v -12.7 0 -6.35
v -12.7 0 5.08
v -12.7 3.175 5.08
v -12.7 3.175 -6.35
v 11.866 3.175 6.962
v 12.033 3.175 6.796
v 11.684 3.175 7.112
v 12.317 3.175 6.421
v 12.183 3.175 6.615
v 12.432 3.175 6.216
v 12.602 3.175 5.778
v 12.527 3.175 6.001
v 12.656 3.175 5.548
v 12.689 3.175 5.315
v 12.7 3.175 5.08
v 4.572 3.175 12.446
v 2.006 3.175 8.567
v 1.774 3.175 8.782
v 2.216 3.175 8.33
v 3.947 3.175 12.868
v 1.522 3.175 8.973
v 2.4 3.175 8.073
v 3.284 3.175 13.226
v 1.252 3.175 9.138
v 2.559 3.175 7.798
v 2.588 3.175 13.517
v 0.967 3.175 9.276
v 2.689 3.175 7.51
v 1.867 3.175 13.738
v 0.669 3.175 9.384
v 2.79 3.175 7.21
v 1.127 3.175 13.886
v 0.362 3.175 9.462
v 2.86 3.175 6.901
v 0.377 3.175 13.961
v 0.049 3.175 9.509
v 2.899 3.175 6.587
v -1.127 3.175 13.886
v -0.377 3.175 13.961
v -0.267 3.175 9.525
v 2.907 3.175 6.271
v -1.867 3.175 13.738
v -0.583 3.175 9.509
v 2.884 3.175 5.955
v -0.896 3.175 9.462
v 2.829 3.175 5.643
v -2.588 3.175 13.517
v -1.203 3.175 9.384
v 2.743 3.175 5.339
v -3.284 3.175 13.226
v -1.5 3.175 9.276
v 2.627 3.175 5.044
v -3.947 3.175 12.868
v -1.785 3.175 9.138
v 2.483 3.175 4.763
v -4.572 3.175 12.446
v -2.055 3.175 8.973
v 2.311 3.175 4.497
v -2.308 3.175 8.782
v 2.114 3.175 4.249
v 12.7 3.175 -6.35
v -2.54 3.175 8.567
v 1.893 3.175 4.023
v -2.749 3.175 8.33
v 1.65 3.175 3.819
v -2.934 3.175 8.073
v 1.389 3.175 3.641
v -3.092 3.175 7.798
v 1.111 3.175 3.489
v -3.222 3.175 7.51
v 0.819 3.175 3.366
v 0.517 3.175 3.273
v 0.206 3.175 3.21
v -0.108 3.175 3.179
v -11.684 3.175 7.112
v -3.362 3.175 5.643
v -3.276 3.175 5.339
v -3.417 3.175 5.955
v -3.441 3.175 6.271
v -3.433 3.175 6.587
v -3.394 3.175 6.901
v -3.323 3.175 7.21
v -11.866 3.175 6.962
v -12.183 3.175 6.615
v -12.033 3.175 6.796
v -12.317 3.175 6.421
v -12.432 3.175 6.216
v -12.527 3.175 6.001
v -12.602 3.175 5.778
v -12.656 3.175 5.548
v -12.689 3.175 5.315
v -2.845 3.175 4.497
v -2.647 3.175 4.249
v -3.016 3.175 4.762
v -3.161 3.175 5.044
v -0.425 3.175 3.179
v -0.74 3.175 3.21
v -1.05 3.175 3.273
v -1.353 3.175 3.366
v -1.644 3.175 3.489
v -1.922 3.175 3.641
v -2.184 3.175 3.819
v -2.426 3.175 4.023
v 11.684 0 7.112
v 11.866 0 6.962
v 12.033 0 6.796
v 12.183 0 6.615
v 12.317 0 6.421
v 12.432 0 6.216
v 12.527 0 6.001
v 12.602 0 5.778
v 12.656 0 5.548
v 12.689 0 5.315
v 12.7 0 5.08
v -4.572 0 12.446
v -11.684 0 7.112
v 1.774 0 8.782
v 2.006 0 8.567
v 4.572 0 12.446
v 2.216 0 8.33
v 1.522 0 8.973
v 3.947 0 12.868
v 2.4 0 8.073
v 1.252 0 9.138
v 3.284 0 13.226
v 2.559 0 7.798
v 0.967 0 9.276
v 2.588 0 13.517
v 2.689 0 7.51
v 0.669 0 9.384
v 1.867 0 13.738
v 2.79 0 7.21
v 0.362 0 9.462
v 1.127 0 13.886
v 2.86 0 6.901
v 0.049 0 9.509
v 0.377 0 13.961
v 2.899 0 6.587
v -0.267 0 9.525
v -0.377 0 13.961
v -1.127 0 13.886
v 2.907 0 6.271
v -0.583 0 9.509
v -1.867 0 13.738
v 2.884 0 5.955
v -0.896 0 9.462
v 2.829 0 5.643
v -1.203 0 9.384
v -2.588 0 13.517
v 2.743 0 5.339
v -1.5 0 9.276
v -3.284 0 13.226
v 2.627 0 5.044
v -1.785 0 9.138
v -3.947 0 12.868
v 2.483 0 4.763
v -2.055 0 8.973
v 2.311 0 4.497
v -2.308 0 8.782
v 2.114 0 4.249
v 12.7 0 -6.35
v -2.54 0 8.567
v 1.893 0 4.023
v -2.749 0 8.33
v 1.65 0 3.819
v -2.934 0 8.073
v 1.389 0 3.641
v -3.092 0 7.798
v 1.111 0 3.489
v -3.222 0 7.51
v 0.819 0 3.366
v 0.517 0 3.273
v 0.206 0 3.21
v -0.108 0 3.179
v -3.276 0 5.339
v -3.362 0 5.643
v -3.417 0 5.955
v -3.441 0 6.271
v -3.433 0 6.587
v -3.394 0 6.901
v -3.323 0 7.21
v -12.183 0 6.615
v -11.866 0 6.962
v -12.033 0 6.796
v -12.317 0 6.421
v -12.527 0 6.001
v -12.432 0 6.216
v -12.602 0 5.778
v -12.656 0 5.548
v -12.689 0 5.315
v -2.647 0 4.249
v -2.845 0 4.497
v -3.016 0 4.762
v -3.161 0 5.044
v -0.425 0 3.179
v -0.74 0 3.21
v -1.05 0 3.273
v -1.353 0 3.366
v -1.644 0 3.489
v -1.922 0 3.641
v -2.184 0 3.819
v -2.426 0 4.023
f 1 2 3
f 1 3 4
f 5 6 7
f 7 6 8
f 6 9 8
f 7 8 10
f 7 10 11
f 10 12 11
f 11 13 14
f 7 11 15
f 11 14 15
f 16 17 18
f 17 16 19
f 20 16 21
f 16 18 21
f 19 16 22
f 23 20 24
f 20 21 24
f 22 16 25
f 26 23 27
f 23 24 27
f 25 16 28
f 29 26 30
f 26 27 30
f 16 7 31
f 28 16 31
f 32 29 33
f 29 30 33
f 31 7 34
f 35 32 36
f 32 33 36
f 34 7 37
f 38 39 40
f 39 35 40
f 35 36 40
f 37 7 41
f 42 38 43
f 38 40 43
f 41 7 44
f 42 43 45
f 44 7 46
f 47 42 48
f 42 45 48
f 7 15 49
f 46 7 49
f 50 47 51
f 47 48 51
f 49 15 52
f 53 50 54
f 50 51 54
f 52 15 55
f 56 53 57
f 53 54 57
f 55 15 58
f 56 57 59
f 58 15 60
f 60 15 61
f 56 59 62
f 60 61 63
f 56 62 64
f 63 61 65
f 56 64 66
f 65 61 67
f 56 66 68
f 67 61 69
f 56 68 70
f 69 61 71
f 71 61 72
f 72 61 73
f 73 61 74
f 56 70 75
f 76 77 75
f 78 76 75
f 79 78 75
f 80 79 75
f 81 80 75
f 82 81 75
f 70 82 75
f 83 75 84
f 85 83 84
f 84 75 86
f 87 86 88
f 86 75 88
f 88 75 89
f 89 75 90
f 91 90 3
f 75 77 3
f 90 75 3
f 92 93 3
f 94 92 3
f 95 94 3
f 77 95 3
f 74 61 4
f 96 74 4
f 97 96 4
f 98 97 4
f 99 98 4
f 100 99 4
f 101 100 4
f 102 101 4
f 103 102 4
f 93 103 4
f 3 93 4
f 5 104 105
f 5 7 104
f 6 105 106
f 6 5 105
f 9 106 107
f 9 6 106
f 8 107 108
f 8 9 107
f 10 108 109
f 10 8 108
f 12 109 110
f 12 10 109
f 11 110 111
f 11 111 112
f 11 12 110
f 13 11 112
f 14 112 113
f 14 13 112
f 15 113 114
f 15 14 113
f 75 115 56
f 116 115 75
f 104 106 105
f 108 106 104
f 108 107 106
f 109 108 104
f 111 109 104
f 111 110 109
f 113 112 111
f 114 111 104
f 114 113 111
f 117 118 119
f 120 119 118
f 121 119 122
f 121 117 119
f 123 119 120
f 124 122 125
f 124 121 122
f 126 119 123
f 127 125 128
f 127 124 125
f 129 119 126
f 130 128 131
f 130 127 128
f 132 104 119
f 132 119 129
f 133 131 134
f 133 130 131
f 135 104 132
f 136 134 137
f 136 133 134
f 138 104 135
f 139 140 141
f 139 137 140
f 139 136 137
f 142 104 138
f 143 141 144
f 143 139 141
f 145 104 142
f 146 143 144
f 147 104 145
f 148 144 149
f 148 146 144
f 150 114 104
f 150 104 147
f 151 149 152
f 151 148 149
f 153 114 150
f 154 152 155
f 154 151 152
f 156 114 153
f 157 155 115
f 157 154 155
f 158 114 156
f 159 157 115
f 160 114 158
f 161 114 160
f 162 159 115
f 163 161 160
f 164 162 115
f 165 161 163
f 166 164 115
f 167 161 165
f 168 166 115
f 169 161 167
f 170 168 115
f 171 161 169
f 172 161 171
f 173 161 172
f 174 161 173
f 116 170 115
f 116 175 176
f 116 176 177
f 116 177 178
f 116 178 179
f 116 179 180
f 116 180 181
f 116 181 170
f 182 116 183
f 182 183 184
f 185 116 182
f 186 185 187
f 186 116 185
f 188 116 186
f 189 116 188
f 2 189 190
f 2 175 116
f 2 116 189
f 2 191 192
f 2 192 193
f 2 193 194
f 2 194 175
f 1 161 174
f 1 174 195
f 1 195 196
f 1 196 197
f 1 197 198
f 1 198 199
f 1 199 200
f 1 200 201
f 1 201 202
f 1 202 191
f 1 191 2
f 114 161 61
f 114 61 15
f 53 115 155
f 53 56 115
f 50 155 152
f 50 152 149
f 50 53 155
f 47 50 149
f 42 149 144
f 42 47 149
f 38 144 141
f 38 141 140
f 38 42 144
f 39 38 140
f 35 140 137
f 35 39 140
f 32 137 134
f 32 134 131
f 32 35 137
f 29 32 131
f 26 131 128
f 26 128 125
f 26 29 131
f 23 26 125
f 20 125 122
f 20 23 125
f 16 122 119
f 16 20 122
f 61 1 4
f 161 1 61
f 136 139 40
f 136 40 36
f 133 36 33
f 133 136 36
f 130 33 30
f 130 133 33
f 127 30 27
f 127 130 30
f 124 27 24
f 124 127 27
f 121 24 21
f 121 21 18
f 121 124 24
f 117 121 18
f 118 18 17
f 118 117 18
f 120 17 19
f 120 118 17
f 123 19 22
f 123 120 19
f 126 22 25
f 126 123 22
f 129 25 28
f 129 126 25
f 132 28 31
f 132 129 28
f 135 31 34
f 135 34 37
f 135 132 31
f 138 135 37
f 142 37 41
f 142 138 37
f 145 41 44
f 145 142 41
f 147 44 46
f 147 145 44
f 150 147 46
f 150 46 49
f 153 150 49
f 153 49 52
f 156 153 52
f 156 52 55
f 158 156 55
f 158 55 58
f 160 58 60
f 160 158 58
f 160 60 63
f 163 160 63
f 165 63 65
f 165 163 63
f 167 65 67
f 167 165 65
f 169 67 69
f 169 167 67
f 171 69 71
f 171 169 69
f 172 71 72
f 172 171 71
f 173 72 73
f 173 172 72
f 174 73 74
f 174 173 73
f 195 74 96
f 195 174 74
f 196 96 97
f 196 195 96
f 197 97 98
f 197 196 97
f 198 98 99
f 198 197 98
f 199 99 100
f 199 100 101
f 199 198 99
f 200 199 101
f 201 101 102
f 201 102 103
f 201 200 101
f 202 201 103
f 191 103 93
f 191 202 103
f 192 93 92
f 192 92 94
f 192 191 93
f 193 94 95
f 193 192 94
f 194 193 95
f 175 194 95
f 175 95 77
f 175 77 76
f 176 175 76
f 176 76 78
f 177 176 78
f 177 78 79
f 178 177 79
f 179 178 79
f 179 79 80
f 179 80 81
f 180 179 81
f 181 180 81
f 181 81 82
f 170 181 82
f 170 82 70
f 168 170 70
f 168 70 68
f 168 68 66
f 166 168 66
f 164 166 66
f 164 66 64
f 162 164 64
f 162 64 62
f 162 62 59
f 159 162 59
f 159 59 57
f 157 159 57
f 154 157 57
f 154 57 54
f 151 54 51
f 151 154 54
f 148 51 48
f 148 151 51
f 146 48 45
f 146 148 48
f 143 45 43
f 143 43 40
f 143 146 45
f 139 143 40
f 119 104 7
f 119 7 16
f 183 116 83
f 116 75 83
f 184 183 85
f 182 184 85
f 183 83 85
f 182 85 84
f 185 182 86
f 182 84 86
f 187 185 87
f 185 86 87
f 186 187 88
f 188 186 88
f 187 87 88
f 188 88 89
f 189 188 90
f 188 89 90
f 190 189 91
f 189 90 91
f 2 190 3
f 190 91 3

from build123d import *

# Parameters (mm, degrees)
SKETCH1_R           = 3.175
BOSS_EXTRUDE1_DEPTH = 3.175
FILLET1_R           = 7.62
FILLET2_R           = 2.54


with BuildPart() as part:
    # Sketch1 → Boss-Extrude1 (new body)
    with BuildSketch(Plane(origin=(0, 0, 0), x_dir=(1, 0, 0), z_dir=(0, 1, 0))):
        Polygon((-12.7, -6.35), (-12.7, 6.35), (12.7, 6.35), (12.7, -6.35), (0, -15.875), align=None)
        with Locations(Location((-0.266746272, -6.35, 0), (0, 0, 270))):
            Circle(SKETCH1_R, mode=Mode.SUBTRACT)
    extrude(amount=BOSS_EXTRUDE1_DEPTH)

    # Fillet1
    fillet1_edges = [part.edges().sort_by_distance(p)[0] for p in [
        (0, 1.5875, 15.875),
    ]]
    fillet(fillet1_edges, radius=FILLET1_R)

    # Fillet2
    fillet2_edges = [part.edges().sort_by_distance(p)[0] for p in [
        (12.7, 1.5875, 6.35),
        (-12.7, 1.5875, 6.35),
    ]]
    fillet(fillet2_edges, radius=FILLET2_R)


solid = part.part
